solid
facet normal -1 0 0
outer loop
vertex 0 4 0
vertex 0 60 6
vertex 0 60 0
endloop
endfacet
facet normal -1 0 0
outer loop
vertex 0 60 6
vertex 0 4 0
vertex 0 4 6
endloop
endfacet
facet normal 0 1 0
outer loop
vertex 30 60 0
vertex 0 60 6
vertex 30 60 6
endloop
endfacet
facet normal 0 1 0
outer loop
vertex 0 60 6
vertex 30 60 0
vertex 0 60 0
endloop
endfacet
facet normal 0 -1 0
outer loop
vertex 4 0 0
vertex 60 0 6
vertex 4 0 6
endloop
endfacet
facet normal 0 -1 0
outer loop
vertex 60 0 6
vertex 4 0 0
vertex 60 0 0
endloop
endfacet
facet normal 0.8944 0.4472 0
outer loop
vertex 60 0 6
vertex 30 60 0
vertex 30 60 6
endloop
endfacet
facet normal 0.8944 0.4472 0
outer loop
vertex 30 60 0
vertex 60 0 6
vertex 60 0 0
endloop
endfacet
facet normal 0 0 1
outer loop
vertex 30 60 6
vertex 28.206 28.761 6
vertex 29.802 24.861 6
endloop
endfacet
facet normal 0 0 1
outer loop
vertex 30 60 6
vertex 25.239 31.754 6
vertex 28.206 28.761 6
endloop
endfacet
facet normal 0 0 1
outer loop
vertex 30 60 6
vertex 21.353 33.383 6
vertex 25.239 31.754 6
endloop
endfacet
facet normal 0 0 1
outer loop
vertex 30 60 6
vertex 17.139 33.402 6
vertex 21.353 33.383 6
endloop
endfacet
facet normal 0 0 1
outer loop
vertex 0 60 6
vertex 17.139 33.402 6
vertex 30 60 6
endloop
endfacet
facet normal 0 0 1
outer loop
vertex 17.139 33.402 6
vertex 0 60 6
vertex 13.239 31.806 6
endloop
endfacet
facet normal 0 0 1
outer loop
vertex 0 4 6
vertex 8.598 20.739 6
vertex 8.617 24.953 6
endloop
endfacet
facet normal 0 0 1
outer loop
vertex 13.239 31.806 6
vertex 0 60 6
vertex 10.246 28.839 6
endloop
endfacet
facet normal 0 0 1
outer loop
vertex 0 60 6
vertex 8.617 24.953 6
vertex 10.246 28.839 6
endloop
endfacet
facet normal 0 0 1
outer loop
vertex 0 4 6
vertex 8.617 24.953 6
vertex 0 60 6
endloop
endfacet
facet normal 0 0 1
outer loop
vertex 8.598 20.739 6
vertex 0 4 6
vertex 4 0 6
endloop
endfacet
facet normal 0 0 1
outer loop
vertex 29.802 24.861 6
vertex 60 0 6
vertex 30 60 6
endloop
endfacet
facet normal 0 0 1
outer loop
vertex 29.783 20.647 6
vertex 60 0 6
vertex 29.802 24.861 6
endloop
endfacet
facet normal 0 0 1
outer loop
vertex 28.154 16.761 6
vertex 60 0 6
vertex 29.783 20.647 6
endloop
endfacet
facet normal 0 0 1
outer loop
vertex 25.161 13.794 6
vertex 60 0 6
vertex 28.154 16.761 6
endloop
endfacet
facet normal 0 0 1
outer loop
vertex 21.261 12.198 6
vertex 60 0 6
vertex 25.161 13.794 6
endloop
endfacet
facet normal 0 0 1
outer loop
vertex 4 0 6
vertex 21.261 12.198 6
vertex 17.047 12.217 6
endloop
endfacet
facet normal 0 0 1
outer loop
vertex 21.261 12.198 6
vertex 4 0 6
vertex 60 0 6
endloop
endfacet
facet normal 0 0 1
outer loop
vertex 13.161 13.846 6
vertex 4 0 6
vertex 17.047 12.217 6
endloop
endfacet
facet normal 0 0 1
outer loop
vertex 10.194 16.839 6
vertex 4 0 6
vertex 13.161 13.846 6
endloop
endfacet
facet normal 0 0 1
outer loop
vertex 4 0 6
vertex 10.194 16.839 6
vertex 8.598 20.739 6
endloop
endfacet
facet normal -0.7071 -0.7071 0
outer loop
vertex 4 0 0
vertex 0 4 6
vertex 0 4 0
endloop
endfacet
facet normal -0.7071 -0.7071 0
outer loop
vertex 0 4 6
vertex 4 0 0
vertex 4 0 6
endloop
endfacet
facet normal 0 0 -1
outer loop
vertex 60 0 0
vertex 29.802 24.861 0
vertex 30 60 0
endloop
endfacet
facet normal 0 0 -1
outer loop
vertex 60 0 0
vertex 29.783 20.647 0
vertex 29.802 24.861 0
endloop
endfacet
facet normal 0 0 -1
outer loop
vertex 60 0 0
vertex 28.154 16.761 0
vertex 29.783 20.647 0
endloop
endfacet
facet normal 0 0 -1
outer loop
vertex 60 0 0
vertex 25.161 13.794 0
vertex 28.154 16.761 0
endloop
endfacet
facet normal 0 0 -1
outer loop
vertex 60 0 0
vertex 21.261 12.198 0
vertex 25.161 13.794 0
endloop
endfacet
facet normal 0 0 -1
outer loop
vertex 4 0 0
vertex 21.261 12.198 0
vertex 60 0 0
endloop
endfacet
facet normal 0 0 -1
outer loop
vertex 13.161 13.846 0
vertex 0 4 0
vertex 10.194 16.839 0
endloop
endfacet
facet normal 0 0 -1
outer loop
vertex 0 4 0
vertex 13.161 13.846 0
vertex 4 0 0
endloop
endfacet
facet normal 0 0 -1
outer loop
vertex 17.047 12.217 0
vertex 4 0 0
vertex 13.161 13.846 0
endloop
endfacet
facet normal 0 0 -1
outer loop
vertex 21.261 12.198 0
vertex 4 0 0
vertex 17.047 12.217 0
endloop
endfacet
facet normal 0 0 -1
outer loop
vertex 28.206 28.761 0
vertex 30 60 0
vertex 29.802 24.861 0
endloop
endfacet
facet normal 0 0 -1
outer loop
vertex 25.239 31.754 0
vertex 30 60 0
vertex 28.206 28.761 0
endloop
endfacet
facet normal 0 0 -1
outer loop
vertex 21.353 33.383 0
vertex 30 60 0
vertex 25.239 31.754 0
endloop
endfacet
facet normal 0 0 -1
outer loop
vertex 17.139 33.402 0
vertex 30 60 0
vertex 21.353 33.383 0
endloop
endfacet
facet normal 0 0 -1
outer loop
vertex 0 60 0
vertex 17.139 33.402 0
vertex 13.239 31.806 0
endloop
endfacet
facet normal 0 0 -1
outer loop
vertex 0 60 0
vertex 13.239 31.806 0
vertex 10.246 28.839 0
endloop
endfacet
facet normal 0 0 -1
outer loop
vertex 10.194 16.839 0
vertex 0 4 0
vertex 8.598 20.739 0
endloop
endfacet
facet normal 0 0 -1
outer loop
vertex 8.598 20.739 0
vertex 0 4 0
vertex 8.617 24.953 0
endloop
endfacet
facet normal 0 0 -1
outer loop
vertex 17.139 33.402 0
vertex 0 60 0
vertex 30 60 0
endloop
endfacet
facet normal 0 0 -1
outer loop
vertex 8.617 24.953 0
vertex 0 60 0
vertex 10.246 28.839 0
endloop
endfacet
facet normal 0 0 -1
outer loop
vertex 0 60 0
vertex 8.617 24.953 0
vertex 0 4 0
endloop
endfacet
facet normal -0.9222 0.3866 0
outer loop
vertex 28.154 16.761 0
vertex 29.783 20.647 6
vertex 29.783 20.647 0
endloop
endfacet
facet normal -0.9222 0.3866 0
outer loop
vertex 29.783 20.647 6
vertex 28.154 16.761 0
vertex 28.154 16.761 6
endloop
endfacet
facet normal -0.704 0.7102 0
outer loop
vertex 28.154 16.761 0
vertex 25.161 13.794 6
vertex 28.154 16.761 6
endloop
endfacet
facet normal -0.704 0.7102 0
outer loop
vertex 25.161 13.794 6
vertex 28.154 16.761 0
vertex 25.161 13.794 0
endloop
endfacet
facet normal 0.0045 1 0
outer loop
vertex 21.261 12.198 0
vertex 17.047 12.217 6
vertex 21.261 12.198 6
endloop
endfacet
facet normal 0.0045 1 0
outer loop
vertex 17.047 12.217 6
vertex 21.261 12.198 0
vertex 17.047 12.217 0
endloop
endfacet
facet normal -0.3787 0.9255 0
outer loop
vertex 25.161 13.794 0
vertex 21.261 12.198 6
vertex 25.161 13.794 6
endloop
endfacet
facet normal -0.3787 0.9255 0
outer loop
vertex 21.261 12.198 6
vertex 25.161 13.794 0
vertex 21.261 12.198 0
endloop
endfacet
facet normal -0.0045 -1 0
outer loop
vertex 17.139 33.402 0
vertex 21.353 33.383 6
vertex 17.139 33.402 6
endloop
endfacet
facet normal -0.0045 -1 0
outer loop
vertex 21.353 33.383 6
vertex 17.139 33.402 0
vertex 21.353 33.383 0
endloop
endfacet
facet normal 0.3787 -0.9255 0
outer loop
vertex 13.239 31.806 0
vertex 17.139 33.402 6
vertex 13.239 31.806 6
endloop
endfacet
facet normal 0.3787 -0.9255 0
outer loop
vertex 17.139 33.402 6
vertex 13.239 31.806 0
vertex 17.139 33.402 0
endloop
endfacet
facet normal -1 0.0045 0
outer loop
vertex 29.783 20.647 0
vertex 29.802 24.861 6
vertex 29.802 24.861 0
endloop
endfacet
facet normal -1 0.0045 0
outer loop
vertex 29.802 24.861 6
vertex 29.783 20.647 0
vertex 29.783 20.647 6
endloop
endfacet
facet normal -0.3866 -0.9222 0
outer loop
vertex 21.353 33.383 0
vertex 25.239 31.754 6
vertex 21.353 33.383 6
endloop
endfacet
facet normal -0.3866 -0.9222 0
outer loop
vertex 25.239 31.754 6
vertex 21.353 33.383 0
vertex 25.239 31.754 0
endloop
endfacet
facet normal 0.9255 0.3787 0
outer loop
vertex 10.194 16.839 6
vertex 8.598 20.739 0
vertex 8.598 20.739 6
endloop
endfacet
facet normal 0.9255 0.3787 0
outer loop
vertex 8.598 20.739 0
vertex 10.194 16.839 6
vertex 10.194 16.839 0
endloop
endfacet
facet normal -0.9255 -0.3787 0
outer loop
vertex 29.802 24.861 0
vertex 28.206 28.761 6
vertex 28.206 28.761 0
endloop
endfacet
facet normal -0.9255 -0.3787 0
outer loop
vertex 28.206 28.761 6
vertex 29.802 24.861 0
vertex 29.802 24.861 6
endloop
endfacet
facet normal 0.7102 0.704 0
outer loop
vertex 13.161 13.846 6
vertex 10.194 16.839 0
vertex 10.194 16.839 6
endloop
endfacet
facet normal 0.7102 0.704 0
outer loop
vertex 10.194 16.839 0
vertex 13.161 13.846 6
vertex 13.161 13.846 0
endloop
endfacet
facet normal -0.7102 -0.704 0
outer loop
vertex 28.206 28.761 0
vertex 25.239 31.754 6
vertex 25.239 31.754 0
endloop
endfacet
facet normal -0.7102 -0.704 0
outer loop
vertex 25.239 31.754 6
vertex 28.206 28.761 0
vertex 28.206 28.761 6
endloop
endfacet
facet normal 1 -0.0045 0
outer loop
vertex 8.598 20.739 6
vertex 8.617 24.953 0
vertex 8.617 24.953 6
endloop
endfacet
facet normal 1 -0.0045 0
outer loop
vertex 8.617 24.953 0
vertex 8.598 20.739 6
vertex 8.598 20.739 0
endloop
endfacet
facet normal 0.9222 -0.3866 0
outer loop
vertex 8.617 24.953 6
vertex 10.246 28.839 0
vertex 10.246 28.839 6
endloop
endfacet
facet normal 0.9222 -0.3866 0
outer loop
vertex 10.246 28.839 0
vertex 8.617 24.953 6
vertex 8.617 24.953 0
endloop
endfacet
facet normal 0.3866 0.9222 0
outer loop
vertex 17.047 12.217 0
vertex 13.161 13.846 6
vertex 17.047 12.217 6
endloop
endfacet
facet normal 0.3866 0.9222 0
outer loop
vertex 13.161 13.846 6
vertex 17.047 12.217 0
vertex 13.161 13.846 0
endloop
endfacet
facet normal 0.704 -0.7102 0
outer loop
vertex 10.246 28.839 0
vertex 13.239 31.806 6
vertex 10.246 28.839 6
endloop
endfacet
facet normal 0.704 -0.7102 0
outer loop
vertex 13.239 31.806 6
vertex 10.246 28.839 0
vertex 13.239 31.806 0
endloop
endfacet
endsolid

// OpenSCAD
$fn = 32;

// ----------------------------------------------------------------------
// Bracket plate: gusset 60 x 60
// ----------------------------------------------------------------------

// --- parameters (mm) ---
hole_r = 3;               // bolt hole radius
plate_t = 6;              // plate thickness, Z (extrusion height)
gus_a = 60;               // base length
gus_b = 60;               // height
top_x = 30;               // top edge X of the angled cut
light_r = 10.8;           // lightening hole radius

light_d = 2 * light_r;

profile = [[4, 0], [30, 0], [60, 0], [30, 60], [0, 60], [0, 4]];  // primary outline, 6 points, counter clockwise
void_1 = [[29.802, 24.861], [28.206, 28.761], [25.239, 31.754], [21.353, 33.383], [17.139, 33.402], [13.239, 31.806], [10.246, 28.839], [8.617, 24.953], [8.598, 20.739], [10.194, 16.839], [13.161, 13.846], [17.047, 12.217], [21.261, 12.198], [25.161, 13.794], [28.154, 16.761], [29.783, 20.647]];  // lightening hole, 16 points

// --- the one profile operation ---
difference() {
  linear_extrude(height = plate_t) polygon(points = profile);
  translate([0, 0, -1])
    linear_extrude(height = plate_t + 2) polygon(points = void_1);
}
